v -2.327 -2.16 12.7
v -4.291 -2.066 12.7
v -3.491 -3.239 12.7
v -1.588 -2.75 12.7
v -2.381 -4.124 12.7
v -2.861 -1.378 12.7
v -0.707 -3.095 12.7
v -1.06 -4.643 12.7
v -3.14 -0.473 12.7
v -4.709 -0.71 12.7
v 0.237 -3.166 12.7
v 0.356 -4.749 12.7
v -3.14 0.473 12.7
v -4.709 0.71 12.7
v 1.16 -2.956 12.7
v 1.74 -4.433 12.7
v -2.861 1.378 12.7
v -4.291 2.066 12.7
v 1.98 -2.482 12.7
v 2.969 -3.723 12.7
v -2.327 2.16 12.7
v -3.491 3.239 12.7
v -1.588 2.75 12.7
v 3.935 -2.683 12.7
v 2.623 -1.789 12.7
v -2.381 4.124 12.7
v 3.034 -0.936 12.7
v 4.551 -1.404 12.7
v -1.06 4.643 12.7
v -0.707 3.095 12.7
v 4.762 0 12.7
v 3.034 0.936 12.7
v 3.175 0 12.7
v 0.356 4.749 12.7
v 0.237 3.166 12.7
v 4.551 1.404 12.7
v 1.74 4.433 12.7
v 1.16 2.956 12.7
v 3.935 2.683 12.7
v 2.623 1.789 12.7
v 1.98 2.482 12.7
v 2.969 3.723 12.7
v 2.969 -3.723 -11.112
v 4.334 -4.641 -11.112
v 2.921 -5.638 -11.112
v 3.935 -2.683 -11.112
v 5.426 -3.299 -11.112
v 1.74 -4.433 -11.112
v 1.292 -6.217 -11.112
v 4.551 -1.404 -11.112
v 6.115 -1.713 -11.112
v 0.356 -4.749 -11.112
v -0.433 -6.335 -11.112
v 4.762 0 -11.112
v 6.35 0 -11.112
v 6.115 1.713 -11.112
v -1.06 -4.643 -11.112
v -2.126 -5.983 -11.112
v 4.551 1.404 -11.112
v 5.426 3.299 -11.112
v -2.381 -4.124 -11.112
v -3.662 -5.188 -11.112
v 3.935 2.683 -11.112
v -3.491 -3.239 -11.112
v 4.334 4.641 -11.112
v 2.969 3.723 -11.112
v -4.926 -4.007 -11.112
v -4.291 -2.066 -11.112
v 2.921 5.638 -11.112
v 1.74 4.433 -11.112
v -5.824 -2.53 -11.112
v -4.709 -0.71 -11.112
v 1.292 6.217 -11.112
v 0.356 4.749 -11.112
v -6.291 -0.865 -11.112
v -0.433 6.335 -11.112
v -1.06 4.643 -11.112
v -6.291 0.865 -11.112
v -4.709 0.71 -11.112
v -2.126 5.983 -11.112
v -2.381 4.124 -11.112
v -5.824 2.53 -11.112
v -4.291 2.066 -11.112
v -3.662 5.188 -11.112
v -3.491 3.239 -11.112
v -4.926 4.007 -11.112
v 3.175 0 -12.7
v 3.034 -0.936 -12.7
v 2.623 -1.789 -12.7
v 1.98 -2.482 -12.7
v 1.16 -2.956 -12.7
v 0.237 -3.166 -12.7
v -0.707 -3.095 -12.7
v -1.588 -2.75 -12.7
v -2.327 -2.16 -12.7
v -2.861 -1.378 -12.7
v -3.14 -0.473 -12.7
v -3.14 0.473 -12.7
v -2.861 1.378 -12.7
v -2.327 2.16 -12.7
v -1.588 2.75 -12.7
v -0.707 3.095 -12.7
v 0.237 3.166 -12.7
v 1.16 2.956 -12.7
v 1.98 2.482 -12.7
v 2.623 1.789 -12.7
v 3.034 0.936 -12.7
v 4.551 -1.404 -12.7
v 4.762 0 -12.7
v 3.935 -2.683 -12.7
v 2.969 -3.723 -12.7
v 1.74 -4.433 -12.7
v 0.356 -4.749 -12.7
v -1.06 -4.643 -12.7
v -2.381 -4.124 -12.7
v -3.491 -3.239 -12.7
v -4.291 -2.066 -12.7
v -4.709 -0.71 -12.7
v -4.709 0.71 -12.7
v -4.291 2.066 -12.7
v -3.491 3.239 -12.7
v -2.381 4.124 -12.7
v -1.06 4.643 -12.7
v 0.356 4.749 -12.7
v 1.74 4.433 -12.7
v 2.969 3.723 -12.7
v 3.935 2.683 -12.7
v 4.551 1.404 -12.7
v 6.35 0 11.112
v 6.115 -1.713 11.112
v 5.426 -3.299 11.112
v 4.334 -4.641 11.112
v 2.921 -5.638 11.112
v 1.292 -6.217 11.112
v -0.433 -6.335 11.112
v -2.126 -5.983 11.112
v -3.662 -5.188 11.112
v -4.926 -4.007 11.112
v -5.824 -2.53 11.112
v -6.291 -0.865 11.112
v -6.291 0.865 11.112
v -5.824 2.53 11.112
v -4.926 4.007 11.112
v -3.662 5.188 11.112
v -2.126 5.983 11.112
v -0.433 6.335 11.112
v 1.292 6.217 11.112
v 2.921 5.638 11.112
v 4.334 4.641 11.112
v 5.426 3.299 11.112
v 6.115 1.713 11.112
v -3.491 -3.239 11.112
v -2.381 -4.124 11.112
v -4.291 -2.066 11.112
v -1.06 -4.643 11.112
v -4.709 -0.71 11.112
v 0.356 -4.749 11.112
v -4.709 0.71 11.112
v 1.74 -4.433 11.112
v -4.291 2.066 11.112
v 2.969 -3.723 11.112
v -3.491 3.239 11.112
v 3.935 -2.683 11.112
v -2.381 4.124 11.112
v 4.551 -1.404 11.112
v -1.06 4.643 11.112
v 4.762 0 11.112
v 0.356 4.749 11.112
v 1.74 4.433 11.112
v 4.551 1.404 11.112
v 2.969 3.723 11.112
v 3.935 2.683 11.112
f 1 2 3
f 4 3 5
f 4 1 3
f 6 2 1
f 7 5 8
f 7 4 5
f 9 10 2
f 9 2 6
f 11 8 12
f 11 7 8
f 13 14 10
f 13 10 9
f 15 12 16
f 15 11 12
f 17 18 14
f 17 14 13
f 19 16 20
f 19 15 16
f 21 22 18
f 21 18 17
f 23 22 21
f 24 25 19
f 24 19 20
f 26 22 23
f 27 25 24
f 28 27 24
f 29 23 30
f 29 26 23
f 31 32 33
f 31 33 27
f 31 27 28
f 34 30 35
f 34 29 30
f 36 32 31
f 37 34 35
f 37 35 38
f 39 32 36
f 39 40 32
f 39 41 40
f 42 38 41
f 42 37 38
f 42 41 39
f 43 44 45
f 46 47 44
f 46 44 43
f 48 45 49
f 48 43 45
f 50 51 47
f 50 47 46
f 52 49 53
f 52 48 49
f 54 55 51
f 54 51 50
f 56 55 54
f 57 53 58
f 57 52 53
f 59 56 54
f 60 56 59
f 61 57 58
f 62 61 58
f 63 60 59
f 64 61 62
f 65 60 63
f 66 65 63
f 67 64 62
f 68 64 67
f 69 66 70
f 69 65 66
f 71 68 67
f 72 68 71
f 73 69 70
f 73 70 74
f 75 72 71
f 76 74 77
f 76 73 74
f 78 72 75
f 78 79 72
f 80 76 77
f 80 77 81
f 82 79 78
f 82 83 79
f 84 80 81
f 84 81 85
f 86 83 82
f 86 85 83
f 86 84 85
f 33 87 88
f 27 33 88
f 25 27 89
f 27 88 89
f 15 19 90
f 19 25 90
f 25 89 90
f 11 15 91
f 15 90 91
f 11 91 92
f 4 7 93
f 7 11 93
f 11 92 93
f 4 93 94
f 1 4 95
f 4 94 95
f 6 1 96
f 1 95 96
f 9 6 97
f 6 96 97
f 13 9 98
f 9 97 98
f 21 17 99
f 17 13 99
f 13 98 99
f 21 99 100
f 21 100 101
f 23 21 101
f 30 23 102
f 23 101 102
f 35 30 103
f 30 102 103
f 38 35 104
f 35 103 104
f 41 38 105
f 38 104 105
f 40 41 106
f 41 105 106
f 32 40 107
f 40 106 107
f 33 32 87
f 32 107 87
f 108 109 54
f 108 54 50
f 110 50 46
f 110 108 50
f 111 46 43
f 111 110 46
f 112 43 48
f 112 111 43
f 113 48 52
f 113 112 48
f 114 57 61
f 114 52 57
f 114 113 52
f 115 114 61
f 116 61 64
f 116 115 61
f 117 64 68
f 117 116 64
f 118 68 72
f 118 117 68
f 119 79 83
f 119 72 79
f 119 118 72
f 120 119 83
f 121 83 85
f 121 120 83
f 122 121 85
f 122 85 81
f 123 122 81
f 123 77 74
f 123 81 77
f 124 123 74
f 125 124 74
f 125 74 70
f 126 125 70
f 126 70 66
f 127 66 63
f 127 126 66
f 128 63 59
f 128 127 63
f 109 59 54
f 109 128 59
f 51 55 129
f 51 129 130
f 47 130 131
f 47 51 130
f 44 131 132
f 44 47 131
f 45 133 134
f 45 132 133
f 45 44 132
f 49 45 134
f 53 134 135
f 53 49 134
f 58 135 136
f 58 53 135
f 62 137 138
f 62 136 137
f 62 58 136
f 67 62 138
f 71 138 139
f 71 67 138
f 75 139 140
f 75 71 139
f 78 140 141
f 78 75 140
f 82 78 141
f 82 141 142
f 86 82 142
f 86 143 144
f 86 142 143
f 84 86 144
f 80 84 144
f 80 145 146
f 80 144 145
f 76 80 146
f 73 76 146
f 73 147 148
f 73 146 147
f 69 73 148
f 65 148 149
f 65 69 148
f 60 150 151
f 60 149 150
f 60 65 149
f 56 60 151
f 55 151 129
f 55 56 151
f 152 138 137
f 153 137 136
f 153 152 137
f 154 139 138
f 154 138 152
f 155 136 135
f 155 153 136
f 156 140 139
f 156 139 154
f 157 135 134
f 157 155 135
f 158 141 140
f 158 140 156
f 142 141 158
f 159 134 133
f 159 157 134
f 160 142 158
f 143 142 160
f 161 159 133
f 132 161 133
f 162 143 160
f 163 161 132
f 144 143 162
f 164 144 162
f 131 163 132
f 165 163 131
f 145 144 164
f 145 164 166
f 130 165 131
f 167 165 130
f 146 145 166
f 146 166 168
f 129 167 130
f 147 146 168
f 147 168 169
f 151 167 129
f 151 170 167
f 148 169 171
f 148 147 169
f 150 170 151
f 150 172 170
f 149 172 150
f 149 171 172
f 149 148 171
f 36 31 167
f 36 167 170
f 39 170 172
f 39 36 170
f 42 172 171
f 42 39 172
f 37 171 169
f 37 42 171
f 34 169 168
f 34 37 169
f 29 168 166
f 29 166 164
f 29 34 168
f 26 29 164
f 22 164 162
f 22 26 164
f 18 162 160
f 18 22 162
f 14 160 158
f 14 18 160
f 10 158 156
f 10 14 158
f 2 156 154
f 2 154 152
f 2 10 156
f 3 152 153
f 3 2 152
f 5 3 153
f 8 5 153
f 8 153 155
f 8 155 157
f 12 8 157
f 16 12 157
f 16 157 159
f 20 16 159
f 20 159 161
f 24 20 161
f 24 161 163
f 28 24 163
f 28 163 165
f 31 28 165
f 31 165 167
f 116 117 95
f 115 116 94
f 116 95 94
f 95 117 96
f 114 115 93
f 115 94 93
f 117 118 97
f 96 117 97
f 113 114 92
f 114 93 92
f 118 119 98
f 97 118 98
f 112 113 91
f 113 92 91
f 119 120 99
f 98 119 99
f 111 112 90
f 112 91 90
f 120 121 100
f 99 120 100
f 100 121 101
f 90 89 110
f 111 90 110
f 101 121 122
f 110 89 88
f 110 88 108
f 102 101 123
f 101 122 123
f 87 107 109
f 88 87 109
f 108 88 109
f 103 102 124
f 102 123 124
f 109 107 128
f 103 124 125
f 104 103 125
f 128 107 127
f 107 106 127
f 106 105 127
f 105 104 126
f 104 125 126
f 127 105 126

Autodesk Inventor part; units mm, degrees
ref_plane "YZ Plane" through (0, 0, 0) normal (1, 0, 0) x (0, 1, 0)
ref_plane "XZ Plane" through (0, 0, 0) normal (0, 1, 0) x (-1, 0, 0)
ref_plane "XY Plane" through (0, 0, 0) normal (0, 0, 1) x (1, 0, 0)
sketch "Sketch1" plane through (0, 0, 0) normal (0, 0, 1) x (1, 0, 0)
  circle A0 centre (0, 0) radius 6.35
  circle A1 centre (0, 0) radius 3.175
  dimension "d0" = 12.7
  dimension "d13" = 3.175
extrude "Base" add sketch "Sketch1" along normal mid plane 25.4
sketch "Sketch4" plane through (0, 0, 12.7) normal (0, 0, 1) x (1, 0, 0)
  circle A0 centre (0, 0) radius 6.35 projected
  circle A1 centre (0, 0) radius 4.7625
  dimension "d16" = 9.525
extrude "Extrusion4" cut sketch "Sketch4" against normal blind 1.5875
mirror "Mirror2" about plane through (0, 0, 0) normal (0, 0, 1) of "Extrusion4"
properties part number "gearbox_standoff" material "Aluminum-6061"
